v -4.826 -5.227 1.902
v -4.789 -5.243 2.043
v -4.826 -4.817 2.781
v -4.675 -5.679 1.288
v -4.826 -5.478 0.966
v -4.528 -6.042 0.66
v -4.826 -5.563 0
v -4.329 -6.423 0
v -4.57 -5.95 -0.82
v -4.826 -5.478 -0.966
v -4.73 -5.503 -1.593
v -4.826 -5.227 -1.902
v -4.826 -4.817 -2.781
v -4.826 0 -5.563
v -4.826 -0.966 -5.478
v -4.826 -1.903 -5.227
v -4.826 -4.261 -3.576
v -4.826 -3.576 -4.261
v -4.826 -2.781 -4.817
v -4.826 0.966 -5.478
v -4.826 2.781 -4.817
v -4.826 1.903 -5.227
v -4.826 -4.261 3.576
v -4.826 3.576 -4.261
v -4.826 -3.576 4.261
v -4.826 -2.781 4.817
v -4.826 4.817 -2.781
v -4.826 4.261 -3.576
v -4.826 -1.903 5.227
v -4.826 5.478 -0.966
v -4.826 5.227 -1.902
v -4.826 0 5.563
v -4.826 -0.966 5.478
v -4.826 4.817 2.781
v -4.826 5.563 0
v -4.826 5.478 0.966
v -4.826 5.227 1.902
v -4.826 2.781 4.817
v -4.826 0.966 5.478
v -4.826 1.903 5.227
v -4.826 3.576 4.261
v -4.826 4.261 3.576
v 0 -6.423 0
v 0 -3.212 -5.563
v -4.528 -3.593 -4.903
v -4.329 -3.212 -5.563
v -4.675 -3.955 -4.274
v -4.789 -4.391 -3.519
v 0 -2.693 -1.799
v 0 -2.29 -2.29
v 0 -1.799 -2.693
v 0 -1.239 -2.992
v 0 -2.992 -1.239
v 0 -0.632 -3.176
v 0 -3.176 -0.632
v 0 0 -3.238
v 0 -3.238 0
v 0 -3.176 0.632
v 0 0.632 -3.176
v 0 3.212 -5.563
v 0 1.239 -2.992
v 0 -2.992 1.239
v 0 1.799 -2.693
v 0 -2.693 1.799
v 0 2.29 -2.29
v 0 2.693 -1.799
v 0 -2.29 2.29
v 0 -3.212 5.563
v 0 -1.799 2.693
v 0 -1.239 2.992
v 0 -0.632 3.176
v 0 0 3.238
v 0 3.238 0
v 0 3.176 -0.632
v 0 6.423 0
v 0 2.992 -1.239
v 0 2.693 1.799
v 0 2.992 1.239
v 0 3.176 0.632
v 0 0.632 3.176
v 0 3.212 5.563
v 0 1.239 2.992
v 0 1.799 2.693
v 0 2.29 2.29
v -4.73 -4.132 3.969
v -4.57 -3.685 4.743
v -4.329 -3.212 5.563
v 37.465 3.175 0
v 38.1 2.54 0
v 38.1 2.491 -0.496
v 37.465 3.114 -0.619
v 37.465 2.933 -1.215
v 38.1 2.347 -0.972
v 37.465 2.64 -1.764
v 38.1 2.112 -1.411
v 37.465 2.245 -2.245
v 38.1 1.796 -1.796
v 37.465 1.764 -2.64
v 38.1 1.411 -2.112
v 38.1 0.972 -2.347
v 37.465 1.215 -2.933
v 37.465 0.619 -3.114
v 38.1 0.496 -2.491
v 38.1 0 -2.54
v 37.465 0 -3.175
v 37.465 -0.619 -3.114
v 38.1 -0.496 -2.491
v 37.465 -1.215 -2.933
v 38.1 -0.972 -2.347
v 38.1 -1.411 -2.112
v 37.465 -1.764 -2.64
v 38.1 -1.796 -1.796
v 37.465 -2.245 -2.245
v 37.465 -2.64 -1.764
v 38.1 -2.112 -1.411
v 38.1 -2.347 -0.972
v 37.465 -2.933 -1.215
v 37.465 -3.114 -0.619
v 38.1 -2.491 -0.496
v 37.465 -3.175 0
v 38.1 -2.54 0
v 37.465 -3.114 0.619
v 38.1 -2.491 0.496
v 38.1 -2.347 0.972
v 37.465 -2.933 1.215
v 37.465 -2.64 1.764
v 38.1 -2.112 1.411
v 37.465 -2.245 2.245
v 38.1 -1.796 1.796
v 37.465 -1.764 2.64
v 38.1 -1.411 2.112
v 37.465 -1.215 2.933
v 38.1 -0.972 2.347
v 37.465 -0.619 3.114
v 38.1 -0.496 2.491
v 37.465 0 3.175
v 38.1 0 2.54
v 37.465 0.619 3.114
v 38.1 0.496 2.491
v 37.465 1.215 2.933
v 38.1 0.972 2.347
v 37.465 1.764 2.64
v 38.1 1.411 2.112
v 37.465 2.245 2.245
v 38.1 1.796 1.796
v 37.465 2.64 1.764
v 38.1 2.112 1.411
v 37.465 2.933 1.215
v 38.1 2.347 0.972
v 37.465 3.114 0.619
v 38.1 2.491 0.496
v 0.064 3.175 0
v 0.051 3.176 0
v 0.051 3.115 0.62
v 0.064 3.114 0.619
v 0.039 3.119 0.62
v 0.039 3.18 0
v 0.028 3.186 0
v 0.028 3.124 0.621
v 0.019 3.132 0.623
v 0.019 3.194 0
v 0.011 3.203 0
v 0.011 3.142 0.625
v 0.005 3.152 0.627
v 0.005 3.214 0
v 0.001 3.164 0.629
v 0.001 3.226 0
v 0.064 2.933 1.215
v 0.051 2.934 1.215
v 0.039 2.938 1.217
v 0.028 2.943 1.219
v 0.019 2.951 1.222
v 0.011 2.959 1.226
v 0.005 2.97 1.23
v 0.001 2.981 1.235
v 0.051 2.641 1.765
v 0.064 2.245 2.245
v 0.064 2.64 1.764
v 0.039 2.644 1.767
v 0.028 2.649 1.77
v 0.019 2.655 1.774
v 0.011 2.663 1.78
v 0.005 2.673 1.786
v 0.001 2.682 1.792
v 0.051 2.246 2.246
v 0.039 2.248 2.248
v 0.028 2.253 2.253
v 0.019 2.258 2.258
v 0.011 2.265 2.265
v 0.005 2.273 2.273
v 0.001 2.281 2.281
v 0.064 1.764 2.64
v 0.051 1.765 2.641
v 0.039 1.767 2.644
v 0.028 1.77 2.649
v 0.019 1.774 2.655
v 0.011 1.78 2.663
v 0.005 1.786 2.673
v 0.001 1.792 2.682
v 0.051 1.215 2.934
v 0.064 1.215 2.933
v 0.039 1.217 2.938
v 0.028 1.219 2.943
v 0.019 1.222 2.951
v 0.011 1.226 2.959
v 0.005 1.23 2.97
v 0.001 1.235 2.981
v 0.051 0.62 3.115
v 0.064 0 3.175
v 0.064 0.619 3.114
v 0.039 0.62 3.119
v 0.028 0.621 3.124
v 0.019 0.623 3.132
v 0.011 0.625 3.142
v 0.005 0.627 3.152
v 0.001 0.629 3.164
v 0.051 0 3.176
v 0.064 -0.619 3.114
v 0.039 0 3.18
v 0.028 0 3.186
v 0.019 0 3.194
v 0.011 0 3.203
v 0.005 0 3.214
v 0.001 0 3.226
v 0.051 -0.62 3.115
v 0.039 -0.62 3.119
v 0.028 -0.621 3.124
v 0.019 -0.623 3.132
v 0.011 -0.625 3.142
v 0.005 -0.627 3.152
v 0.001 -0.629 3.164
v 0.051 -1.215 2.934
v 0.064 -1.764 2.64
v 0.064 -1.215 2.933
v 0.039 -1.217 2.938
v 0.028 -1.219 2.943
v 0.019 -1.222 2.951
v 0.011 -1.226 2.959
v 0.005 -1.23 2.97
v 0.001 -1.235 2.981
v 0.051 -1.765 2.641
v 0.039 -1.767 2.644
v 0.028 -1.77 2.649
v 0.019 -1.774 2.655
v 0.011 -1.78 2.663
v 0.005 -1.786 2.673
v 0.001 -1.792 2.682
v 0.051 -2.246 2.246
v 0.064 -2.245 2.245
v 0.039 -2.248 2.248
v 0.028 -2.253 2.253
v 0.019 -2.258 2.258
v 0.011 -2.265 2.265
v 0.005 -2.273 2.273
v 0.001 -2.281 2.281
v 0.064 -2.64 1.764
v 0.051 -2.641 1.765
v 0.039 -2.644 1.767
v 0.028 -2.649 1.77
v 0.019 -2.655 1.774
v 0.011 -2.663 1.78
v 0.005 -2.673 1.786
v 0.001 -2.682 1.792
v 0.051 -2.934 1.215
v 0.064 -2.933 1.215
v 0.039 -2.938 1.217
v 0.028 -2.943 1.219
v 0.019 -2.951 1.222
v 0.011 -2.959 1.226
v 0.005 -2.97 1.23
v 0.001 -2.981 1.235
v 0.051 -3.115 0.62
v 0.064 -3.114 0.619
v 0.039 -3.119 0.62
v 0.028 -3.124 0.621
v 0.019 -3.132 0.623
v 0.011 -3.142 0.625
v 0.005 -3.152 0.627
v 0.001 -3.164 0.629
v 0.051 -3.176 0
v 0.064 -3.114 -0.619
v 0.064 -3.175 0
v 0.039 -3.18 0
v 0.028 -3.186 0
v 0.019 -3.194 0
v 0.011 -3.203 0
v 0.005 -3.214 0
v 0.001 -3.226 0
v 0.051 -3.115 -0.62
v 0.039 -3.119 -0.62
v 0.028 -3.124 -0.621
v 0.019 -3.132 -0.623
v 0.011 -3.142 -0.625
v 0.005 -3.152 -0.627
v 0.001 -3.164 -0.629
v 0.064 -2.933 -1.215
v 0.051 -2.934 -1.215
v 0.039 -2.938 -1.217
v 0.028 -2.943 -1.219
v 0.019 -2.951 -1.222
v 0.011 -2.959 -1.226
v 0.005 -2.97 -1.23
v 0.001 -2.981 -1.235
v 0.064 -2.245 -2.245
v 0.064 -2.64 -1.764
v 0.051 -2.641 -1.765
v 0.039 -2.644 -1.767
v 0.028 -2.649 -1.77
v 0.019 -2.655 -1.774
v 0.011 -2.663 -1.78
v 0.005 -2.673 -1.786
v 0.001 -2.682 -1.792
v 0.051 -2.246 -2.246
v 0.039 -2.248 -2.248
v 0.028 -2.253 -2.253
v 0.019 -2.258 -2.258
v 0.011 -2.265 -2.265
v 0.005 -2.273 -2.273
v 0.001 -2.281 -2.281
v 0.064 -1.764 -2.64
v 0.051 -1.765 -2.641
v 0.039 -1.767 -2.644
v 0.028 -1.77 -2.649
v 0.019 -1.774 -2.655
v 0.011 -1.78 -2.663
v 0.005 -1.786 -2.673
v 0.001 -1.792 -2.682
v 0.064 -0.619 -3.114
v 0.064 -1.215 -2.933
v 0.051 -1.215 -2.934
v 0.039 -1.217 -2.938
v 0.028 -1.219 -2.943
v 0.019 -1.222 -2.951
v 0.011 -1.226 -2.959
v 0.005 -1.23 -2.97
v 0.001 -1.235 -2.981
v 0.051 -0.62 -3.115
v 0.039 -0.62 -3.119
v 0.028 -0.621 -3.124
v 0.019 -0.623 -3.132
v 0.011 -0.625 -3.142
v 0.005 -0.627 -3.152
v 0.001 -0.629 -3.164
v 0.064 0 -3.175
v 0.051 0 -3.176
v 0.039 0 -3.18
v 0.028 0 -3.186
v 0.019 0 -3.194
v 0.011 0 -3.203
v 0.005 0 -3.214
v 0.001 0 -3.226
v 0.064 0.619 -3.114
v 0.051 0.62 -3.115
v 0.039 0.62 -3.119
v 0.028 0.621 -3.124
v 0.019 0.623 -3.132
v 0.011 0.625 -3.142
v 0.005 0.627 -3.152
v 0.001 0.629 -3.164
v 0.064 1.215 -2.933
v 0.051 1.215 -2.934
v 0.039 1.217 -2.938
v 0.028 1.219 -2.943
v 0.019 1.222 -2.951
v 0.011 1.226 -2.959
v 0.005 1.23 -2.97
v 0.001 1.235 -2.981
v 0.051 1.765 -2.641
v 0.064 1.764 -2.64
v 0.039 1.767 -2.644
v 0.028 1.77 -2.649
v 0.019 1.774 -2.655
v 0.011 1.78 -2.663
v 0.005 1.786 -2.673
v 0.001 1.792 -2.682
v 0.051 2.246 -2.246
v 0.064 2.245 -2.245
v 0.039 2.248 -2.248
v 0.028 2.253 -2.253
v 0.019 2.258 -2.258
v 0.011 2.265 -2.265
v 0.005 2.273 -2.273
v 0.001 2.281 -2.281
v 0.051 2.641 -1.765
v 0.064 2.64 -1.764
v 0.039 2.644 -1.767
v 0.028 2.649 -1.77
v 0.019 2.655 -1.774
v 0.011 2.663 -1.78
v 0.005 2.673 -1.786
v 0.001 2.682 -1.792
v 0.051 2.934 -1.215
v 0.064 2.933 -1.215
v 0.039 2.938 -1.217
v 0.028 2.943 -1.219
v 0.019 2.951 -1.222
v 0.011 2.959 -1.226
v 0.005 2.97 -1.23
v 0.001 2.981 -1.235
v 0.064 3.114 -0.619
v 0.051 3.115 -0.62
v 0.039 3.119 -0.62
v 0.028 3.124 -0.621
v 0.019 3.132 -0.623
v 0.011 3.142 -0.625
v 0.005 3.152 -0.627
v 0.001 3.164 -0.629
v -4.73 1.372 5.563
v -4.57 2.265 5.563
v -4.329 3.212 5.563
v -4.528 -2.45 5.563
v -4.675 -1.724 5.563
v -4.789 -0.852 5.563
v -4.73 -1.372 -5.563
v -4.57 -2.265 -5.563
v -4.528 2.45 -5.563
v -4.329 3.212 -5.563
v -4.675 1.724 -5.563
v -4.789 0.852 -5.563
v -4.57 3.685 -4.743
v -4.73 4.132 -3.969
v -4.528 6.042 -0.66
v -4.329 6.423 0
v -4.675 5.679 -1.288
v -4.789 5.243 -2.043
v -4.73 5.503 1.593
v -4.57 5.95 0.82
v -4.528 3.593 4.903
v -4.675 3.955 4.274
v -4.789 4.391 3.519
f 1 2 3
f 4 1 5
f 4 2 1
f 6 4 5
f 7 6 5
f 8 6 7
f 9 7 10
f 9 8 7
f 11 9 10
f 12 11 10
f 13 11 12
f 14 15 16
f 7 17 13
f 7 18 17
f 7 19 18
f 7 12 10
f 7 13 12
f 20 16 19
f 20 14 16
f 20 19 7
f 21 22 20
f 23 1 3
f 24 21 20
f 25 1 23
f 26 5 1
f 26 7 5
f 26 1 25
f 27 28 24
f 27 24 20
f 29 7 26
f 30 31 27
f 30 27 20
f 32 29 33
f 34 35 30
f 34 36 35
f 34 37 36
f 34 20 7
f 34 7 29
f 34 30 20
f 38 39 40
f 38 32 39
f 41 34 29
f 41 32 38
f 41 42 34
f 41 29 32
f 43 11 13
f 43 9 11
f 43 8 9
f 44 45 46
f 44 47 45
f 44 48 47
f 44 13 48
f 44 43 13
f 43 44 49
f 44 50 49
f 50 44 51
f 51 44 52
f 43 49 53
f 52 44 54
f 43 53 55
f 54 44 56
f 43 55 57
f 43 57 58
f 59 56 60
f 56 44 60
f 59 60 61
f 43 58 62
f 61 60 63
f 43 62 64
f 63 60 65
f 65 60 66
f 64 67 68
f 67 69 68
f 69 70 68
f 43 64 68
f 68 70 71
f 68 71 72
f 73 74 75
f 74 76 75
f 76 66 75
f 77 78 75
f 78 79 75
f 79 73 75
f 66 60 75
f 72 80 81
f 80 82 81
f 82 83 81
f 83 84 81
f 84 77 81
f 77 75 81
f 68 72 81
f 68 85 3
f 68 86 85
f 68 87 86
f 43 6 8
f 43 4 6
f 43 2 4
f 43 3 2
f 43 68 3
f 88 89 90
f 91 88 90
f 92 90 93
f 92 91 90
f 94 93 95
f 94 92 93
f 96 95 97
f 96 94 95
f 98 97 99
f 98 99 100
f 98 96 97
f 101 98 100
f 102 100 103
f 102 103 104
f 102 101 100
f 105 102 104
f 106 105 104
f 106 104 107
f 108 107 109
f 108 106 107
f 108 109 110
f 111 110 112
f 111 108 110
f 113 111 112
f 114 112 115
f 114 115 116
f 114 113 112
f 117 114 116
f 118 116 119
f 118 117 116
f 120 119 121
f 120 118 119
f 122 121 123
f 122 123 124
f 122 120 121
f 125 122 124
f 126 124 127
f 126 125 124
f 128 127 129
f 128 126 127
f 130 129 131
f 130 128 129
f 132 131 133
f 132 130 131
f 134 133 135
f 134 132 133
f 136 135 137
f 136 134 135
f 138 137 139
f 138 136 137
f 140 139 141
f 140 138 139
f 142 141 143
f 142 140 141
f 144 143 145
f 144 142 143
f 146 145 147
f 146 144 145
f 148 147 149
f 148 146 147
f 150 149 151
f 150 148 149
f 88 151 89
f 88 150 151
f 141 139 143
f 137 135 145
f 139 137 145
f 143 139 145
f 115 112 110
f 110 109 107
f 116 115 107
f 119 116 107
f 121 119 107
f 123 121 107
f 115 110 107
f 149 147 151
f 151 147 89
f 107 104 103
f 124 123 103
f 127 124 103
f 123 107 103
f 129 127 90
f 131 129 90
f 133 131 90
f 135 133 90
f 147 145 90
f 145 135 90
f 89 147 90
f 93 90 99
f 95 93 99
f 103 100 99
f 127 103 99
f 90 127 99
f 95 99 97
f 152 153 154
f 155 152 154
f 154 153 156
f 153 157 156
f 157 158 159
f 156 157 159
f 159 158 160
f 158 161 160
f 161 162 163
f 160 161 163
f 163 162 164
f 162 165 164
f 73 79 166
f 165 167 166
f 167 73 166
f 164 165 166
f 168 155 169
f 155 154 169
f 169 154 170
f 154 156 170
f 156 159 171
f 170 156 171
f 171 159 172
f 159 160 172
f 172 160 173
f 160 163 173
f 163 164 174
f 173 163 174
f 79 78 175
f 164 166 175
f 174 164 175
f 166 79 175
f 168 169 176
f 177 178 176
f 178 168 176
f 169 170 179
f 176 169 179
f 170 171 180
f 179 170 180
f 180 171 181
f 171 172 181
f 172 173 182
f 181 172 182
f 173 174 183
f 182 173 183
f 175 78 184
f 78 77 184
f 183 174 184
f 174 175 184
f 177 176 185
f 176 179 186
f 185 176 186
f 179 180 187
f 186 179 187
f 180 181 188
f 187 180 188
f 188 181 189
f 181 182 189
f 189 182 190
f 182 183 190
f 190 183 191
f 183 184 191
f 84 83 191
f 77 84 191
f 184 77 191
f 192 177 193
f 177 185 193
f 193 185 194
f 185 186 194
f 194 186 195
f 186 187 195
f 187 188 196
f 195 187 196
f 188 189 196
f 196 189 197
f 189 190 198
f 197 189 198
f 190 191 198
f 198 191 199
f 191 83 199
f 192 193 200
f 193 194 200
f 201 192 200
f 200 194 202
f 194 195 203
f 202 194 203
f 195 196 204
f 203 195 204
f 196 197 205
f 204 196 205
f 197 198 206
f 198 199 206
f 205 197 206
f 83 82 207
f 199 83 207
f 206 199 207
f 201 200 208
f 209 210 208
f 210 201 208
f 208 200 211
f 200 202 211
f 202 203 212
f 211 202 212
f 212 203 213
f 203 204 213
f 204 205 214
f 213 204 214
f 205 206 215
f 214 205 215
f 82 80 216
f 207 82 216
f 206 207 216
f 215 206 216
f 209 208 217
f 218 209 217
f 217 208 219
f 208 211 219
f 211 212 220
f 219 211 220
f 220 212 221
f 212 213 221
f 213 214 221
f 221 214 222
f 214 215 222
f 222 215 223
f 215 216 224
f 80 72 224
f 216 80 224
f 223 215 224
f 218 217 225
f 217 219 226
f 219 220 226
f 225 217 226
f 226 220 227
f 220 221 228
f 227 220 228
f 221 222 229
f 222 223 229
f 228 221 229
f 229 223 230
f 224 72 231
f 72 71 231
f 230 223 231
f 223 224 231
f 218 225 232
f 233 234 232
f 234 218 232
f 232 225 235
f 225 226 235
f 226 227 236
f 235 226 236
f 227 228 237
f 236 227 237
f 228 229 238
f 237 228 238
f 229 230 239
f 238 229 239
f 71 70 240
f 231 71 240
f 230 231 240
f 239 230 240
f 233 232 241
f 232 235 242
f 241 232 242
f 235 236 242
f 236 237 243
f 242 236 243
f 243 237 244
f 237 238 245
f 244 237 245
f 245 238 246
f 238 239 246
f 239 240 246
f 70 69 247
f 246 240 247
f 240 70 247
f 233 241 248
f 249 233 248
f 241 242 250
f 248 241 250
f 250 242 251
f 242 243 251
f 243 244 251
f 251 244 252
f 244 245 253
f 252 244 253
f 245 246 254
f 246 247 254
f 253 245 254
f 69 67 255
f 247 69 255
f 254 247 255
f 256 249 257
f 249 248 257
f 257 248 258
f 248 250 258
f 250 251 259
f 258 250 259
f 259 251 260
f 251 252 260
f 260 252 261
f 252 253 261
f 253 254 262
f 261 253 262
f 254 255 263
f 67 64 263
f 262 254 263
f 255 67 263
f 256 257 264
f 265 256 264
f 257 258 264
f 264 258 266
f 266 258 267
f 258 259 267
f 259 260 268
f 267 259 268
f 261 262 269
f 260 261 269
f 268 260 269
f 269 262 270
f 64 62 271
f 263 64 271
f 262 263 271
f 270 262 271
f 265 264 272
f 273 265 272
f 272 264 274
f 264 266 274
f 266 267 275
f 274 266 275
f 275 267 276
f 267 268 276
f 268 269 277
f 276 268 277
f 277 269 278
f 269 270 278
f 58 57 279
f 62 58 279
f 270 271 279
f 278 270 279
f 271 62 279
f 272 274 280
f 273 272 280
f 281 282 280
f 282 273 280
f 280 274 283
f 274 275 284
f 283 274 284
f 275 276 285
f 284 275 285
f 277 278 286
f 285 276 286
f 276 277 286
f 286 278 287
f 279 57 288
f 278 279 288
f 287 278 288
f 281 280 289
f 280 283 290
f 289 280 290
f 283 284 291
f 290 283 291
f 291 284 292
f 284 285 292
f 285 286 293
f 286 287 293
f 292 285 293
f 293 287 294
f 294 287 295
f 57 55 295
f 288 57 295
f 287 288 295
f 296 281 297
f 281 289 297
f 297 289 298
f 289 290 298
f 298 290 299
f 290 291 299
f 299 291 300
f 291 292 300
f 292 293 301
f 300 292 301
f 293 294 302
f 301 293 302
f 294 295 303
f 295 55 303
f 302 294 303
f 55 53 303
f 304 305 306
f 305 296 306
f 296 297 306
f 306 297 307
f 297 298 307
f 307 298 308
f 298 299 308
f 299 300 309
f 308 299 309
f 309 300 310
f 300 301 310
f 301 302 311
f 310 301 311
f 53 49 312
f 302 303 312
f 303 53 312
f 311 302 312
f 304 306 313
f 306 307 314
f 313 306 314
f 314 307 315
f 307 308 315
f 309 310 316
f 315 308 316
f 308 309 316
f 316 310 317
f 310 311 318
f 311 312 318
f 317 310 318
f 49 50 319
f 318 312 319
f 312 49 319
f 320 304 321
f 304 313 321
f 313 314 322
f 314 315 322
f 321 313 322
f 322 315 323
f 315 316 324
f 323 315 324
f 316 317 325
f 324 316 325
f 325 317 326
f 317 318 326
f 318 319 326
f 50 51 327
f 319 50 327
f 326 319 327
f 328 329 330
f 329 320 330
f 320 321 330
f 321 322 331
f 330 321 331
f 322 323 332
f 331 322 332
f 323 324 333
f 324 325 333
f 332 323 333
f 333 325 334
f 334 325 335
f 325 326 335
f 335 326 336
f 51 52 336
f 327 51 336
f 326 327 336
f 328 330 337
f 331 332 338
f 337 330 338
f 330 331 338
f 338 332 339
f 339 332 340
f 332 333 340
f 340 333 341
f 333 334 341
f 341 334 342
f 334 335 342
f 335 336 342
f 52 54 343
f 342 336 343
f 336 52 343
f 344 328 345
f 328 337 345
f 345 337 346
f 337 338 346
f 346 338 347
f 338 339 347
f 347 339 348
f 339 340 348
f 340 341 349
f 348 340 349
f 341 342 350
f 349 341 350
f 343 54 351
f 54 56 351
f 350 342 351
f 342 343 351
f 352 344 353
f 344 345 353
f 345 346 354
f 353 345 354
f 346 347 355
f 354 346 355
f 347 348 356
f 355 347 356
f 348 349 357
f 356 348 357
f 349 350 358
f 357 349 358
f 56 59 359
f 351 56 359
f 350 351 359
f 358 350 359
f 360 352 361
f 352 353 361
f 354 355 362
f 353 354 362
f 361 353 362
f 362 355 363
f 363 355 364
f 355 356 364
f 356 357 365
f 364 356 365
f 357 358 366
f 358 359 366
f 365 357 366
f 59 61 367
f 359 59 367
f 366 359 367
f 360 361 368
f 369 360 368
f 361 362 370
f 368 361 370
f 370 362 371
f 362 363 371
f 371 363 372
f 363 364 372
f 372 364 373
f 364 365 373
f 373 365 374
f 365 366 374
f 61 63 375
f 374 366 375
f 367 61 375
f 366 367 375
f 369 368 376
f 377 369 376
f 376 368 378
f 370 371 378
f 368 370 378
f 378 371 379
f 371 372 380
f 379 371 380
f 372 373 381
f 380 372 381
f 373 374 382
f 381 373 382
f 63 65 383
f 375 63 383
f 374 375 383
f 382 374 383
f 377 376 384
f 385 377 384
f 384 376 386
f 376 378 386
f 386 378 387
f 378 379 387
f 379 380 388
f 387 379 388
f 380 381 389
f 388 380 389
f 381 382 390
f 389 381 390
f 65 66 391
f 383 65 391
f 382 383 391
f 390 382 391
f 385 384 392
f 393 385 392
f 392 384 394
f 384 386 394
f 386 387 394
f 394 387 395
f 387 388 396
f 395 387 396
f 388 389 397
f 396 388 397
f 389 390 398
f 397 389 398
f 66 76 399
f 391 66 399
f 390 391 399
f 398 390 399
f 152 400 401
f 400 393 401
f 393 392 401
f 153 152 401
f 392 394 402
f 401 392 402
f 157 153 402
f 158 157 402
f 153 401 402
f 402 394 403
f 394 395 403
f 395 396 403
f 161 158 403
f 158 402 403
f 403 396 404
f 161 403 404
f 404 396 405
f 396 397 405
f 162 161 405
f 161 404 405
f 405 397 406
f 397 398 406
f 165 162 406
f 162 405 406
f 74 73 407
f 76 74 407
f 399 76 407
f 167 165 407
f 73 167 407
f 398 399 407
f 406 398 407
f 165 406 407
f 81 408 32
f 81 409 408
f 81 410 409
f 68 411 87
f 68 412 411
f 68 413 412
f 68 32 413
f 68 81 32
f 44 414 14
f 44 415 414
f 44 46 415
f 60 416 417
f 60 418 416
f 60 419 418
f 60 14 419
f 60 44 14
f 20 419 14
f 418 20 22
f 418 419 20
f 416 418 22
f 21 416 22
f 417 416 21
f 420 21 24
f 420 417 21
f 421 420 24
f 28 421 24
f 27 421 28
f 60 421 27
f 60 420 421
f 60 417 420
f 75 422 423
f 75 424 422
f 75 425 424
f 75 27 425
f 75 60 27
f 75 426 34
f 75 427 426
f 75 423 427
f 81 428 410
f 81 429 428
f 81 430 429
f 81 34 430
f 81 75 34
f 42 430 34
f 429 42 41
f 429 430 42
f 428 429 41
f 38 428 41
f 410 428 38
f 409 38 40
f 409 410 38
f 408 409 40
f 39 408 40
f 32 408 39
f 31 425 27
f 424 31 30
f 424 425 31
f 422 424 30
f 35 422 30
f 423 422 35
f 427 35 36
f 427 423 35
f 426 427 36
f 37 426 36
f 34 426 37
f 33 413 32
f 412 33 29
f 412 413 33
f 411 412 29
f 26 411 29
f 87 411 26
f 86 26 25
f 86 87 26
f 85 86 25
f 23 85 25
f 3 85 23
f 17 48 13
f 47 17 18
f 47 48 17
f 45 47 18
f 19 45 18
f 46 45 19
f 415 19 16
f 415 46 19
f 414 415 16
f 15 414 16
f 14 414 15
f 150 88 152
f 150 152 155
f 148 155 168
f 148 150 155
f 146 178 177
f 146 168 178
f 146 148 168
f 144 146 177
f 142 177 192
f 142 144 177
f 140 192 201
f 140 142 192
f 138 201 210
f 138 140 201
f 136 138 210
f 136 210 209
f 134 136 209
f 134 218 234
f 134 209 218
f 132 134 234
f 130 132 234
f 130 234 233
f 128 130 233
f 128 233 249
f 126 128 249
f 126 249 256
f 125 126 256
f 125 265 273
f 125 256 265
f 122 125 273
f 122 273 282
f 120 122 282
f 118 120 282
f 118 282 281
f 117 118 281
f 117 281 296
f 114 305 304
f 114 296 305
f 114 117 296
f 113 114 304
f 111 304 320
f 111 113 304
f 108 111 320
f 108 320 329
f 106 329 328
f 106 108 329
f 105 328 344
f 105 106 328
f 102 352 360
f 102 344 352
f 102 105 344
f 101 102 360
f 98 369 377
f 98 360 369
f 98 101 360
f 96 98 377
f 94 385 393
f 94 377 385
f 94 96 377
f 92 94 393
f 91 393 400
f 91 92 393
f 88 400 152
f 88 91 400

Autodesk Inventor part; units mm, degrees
ref_plane "YZ Plane" through (0, 0, 0) normal (1, 0, 0) x (0, 1, 0)
ref_plane "XZ Plane" through (0, 0, 0) normal (0, 1, 0) x (-1, 0, 0)
sketch "Sketch1" plane through (0, 0, 0) normal (0, 0, 1) x (1, 0, 0)
  line L0 (0, 3.175) -> (38.1, 3.175)
  line L1 (38.1, 3.175) -> (38.1, 0)
  line L2 (38.1, 0) -> (0, 0)
  line L3 (-7.62, 0) -> (45.72, 0) projected
  line L4 (0, -0.635) -> (0, 3.81) projected
  line L5 (0, 3.175) -> (0, 0)
  dimension "d2" = 6.35
  dimension "d59" = 38.1
revolve "Body" add sketch "Sketch1" angle 360 about axis through (38.1, 0, 0) along (-1, 0, 0)
sketch "Sketch2" plane through (0, 0, 0) normal (-1, 0, 0) x (0, 0, 1)
  line L0 (0, 6.4231) -> (5.5626, 3.2116)
  line L1 (5.5626, 3.2116) -> (5.5626, -3.2116)
  line L2 (5.5626, -3.2116) -> (0, -6.4231)
  line L3 (0, -6.4231) -> (-5.5626, -3.2116)
  line L4 (-5.5626, -3.2116) -> (-5.5626, 3.2116)
  line L5 (-5.5626, 3.2116) -> (0, 6.4231)
  line L6 (-7.7876, 0) -> (7.7876, 0) projected
  line L7 (0, 8.9924) -> (0, -8.9924) projected
  point P0 (0, 0)
  point P1 (0, 0)
  dimension "d11" = 11.1252
extrude "Head" add sketch "Sketch2" along normal blind 4.826
sketch "Sketch4" plane through (0, 0, 0) normal (0, 0, 1) x (1, 0, 0)
  line L0 (-4.1837, 6.6751) -> (-4.826, 5.5626)
  line L1 (-1.1, 0) -> (-0.234, 0)
  line L2 (-5.7444, 0) -> (0.6844, 0) projected
  line L3 (-4.826, 6.6751) -> (-4.1837, 6.6751)
  line L4 (-4.826, 5.5626) -> (-4.826, 6.6751)
  line L5 (0, 8.0101) -> (0, -1.335) projected
  dimension "d65" = 11.1252
  dimension "d67" = 30
  dimension "d68" = 13.3502
  dimension "d69" = 4.826
revolve "Chamfer1" cut sketch "Sketch4" angle 360 about axis through (-1.1, 0, 0) along (1, 0, 0)
thread "Thread" size "1/4-20 UNC" class "2A" standard "ANSI Unified Screw Threads" length 32.385
chamfer "Chamfer2" distance 0.635 distance2 0.6351 1 edges at (38.1, -3.175, 0) measured on face at (38.1, -0.8017, 1.6073)
fillet "Fillet" radius 0.0635 1 edges at (0, -3.175, 0)
ref_plane "Work Plane1" through (1.525, 0, 0) normal (0, 0, 1) x (1, 0, 0)
equation "\"d2\" = GD"
equation "\"d59\" = NLG"
equation "\"d11\" = SW"
equation "\"d3\" = KOH"
equation "\"d15\" = GEL"
equation "\"d6\" = -0.5 * SPD + 0.5 * GD"
equation "\"d71\" = RR"
equation "\"d65\" = SW"
equation "\"d67\" = ANG1"
equation "\"d68\" = 1.2 * SW"
equation "\"d69\" = KOH"
equation "\"NLG\" = 38.1"
equation "\"GD\" = NND"
equation "\"BDM\" = NND"
equation "\"KOH\" = 4.826"
equation "\"GEL\" = 32.385"
equation "\"SW\" = 11.1252"
equation "\"SW0\" = SW"
equation "\"SPD\" = GD1"
equation "\"SD2\" = NND"
equation "\"SD\" = 0"
equation "\"ANG1\" = 30deg"
equation "\"GAL\" = 0.635"
equation "\"GUL\" = GAL"
equation "\"RR\" = 0.0635"
equation "\"RR1\" = 0.1"
equation "\"GD1\" = 5.08"
equation "\"THREADDIA\" = 6.35"
equation "\"SDH\" = SW"
equation "\"TOA\" = 30deg"
equation "\"NND\" = 6.35"
equation "\"E0\" = 1.155 * SW"
properties part number "ANSI B18.6.3 - 1/4-20 UNC - 1.5" material "Steel, Mild"
